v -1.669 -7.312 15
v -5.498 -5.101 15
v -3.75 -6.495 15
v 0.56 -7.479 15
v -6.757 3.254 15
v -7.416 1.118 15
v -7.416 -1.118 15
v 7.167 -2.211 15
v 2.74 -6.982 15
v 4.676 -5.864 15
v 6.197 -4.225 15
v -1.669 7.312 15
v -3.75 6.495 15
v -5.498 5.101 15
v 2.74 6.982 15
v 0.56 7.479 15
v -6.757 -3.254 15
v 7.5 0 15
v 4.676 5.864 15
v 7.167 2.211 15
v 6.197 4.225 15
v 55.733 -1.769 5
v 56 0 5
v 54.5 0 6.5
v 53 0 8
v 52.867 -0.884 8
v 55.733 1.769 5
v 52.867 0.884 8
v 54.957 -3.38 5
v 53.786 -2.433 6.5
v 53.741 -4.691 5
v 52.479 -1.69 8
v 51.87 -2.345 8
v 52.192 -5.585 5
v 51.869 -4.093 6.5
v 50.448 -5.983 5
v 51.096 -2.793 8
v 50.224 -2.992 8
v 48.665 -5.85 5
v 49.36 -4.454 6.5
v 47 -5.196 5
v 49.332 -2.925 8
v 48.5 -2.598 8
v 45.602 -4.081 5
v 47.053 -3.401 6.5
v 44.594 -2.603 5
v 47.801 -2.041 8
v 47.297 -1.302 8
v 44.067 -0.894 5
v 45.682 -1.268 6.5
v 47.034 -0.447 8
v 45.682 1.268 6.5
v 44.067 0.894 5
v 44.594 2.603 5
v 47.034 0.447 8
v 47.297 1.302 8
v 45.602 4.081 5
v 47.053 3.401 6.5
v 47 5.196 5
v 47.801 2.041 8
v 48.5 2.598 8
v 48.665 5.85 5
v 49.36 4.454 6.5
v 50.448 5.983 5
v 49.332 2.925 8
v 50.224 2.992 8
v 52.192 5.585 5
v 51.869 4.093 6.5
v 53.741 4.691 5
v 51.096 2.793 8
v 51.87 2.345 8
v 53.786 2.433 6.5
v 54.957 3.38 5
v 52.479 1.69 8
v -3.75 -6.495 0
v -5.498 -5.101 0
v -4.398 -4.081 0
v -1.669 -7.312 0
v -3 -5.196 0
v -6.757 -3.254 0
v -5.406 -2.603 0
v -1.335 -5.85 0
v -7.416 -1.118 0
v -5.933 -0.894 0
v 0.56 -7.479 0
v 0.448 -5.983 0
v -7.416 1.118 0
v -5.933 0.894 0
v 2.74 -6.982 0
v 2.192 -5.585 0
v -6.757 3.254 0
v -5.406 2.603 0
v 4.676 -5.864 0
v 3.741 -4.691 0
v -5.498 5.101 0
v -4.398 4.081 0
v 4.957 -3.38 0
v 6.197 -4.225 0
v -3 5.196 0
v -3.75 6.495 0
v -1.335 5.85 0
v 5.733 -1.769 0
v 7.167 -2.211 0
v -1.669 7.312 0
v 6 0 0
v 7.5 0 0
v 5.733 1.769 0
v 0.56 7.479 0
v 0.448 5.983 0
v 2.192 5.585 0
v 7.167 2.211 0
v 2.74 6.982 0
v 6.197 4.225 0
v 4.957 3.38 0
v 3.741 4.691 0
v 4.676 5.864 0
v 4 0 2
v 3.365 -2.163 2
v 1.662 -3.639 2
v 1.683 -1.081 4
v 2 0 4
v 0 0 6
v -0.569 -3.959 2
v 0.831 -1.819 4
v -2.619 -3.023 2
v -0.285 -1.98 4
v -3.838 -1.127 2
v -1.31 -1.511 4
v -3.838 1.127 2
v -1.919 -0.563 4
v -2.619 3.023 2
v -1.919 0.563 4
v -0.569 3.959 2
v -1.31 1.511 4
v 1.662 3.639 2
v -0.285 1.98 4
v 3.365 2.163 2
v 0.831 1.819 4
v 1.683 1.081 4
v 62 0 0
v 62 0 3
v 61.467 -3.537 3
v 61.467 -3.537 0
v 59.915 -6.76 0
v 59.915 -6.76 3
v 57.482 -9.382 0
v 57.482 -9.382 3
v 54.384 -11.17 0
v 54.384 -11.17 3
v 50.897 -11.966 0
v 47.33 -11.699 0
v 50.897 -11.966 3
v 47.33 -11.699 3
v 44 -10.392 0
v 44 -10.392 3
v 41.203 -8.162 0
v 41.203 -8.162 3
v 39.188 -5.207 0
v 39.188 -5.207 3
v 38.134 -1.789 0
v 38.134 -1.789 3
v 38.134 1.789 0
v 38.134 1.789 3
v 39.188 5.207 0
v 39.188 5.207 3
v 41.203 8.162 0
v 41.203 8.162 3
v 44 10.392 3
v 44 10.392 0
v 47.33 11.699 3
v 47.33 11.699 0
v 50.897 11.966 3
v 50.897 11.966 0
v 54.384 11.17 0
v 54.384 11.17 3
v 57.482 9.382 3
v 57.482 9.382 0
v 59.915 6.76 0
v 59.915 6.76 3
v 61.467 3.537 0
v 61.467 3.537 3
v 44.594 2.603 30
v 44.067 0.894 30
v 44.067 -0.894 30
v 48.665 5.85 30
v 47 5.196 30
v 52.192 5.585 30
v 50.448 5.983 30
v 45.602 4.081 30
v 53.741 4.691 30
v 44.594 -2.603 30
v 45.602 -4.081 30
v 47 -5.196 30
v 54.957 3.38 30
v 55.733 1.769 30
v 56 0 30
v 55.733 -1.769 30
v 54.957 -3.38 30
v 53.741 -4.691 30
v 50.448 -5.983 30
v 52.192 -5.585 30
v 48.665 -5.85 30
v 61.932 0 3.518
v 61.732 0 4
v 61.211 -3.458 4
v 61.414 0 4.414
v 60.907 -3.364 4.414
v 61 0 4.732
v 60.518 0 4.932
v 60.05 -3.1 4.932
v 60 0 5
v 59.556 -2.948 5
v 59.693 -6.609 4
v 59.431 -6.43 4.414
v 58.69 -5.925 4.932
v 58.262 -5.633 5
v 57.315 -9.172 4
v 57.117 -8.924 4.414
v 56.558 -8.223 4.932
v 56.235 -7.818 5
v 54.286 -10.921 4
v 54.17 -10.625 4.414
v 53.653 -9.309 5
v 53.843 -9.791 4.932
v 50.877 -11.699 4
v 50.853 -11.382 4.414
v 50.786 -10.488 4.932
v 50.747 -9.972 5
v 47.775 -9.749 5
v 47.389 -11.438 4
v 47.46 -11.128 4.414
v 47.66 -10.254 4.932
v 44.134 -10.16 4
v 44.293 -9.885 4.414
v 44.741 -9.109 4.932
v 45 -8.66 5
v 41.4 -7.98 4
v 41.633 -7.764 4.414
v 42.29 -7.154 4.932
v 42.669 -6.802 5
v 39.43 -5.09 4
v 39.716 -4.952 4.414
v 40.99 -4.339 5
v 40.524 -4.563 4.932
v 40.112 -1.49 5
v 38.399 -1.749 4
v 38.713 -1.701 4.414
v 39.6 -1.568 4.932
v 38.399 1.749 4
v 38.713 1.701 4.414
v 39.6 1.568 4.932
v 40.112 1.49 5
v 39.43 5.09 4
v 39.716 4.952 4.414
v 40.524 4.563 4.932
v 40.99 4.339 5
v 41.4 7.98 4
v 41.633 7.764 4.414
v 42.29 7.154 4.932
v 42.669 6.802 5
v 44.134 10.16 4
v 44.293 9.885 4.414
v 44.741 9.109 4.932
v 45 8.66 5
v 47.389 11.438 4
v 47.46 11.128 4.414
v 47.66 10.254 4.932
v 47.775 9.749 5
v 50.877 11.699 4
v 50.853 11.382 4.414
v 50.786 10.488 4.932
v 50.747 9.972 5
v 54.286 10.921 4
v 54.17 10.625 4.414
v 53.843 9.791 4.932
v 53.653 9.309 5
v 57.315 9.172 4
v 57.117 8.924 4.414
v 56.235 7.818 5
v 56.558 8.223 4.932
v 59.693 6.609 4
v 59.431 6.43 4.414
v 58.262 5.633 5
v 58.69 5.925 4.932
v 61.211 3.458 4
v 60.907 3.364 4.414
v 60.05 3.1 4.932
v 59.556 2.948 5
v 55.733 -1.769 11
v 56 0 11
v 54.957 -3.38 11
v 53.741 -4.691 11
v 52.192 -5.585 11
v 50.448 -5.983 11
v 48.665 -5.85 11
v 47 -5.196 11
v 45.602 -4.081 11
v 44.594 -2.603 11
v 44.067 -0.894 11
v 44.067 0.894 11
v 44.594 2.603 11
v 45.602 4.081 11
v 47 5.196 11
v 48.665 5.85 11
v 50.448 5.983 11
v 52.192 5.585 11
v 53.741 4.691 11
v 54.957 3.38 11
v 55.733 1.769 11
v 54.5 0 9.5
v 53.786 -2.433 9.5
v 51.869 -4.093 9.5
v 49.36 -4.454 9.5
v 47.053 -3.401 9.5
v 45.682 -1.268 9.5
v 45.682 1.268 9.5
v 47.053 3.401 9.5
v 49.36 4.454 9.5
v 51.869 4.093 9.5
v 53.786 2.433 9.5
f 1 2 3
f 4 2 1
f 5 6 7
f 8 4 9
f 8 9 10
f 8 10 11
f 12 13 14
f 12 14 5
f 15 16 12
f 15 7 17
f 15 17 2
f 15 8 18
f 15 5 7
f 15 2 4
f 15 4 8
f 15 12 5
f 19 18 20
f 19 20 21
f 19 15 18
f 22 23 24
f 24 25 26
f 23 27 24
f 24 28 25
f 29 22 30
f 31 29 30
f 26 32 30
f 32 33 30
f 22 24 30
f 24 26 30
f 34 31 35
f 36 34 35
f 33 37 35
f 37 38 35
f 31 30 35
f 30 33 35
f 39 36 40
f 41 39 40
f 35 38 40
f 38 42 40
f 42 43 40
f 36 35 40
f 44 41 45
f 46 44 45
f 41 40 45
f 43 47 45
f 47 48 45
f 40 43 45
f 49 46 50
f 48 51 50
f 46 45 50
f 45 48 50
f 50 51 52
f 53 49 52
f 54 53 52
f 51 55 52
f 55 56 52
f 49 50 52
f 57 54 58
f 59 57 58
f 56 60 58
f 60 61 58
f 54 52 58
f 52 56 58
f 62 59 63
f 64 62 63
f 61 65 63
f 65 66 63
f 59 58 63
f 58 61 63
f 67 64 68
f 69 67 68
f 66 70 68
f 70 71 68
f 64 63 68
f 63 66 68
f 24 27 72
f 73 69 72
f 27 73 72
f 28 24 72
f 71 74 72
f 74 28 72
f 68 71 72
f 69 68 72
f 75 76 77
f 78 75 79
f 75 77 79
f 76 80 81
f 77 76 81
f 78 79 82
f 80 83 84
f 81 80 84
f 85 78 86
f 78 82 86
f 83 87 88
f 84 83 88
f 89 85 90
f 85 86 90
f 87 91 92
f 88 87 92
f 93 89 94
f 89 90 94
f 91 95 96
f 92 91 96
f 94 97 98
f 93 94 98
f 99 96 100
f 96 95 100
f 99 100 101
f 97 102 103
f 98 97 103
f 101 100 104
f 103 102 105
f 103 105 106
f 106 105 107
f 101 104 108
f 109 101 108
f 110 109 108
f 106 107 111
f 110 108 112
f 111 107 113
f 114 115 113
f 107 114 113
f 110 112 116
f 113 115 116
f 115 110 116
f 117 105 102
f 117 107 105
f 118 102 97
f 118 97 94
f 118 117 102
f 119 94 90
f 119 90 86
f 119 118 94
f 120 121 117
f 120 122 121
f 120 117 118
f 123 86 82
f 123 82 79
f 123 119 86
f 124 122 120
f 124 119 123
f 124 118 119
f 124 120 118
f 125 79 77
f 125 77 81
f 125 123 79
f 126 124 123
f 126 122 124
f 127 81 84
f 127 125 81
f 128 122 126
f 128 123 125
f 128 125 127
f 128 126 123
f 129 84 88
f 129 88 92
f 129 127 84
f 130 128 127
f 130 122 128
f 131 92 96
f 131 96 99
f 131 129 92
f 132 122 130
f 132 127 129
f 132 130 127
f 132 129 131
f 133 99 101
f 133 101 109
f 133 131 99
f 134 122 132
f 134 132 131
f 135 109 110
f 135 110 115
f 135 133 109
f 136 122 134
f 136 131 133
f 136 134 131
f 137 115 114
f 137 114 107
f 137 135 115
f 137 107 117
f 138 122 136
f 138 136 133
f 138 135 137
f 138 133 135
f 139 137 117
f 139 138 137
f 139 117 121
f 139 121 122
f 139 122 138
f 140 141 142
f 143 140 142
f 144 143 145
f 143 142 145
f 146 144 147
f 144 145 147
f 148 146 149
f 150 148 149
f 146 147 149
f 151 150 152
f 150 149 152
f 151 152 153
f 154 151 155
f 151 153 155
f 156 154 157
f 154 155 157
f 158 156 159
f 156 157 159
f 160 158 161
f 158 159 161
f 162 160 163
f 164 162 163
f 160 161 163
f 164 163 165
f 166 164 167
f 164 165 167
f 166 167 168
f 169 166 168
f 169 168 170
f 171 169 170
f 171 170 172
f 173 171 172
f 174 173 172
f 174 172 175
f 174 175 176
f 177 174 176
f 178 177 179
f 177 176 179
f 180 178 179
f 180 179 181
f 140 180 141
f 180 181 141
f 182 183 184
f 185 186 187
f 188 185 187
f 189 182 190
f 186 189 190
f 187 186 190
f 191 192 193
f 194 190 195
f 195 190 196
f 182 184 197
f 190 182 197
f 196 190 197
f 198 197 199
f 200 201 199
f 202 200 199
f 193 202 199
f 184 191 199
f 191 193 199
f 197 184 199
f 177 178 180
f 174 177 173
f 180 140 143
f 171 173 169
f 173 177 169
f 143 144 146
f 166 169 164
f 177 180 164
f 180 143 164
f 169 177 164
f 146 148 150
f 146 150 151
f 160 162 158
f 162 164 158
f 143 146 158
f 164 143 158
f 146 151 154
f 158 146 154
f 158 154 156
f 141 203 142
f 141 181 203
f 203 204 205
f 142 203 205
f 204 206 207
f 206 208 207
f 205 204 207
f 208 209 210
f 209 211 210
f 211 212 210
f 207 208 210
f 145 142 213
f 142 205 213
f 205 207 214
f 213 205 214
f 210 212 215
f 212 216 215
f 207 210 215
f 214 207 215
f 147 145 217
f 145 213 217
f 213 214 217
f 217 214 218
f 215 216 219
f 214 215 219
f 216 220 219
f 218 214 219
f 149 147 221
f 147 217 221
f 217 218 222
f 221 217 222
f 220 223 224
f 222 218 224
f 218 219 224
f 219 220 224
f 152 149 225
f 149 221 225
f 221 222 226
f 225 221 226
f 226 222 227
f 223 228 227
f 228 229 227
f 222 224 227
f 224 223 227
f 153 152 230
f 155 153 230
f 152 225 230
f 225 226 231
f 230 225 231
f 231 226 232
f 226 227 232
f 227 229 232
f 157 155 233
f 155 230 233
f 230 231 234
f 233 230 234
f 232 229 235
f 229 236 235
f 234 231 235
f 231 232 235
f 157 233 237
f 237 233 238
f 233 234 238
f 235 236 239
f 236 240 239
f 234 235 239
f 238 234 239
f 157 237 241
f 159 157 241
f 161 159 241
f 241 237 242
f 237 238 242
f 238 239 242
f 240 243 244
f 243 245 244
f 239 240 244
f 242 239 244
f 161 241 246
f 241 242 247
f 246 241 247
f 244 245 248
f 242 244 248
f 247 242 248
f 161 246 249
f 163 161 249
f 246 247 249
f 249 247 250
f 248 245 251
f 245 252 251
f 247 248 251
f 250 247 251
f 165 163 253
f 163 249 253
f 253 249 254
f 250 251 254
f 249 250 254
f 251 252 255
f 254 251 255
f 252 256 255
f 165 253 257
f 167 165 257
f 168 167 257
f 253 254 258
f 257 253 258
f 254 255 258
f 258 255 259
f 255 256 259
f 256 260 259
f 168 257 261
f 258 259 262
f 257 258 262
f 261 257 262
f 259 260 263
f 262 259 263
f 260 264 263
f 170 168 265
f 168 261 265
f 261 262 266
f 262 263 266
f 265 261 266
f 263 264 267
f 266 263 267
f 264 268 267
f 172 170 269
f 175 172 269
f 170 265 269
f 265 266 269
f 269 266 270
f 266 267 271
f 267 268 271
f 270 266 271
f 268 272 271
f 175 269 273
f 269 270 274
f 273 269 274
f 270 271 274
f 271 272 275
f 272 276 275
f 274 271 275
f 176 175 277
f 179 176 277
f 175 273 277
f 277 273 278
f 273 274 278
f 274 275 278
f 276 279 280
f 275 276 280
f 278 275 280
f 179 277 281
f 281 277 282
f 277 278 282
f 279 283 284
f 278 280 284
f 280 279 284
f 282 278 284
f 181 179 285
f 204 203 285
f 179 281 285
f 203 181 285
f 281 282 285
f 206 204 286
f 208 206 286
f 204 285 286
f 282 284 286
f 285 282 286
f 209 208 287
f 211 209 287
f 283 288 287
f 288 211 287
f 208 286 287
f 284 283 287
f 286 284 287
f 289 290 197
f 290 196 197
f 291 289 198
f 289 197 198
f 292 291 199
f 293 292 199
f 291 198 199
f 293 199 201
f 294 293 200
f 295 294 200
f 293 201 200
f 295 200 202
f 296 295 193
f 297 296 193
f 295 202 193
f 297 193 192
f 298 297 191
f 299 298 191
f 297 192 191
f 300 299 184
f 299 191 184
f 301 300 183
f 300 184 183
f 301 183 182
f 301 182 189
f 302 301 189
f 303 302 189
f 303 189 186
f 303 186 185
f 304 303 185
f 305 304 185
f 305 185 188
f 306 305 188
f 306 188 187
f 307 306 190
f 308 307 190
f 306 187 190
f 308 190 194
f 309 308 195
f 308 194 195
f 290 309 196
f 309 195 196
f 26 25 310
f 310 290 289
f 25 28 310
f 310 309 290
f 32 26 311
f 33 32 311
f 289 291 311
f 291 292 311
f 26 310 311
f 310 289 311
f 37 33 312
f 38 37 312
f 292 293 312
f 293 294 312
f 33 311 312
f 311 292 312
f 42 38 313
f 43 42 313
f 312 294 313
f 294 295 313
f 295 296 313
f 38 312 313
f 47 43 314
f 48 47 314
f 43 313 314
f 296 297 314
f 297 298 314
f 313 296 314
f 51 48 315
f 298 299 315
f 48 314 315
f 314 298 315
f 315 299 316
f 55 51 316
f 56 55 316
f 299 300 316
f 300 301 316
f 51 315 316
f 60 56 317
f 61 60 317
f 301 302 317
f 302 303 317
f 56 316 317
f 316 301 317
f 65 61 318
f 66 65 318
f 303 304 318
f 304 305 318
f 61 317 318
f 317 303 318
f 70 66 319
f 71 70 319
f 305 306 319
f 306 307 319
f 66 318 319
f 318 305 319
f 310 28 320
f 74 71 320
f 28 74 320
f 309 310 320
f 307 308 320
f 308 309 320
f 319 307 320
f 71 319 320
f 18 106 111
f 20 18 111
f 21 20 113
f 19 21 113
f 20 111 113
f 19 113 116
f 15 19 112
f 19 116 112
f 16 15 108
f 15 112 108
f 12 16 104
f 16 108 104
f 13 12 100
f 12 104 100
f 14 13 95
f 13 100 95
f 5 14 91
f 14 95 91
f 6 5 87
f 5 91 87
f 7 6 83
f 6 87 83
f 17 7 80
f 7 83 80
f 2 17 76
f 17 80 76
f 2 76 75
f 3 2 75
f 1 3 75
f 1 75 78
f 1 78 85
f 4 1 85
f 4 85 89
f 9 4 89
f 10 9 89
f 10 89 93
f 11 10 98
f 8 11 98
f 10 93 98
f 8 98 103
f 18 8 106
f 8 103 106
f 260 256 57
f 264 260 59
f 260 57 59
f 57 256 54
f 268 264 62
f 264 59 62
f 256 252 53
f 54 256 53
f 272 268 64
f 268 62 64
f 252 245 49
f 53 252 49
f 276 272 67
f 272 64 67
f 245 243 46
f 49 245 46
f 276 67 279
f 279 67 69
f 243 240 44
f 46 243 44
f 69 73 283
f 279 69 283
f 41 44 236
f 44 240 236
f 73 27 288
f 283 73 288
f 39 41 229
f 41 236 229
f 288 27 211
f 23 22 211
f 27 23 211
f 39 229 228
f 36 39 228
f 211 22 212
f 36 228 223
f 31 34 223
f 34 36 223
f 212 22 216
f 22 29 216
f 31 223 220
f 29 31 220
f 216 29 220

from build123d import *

# Parameters (mm, degrees)
F0_R     = 7.5
F1_DEPTH = 15
F7_R     = 2


with BuildPart() as f1:
    # F0 (on Top) → F1 (new body)
    with BuildSketch(Plane.XY):
        Circle(F0_R)
    extrude(amount=F1_DEPTH)

    # F2 (on Front) → F3 (revolve, cut)
    with BuildSketch(Plane.XZ):
        Polygon((0, 6), (0, 0), (6, 0), align=None)
    revolve(axis=Axis((0, 0, 3), (0, 0, -1)), mode=Mode.SUBTRACT)


with BuildPart() as f5:
    # F4 (on Front) → F5 (revolve)
    with BuildSketch(Plane.XZ):
        Polygon((0, 30), (0, 0), (12, 0), (12, 5), (6, 5), (3, 8), (6, 11), (6, 30), align=None)
    revolve(axis=Axis((0, 0, 15), (0, 0, -1)))


with BuildPart() as f5_1:
    # F6: moved
    add(f5.part.moved(Location((50, 0, 0))))

    # F7
    f7_edges = [f5_1.edges().sort_by_distance(p)[0] for p in [
        (38, 0, 5),
    ]]
    fillet(f7_edges, radius=F7_R)


solid = Compound([f1.part, f5_1.part])
